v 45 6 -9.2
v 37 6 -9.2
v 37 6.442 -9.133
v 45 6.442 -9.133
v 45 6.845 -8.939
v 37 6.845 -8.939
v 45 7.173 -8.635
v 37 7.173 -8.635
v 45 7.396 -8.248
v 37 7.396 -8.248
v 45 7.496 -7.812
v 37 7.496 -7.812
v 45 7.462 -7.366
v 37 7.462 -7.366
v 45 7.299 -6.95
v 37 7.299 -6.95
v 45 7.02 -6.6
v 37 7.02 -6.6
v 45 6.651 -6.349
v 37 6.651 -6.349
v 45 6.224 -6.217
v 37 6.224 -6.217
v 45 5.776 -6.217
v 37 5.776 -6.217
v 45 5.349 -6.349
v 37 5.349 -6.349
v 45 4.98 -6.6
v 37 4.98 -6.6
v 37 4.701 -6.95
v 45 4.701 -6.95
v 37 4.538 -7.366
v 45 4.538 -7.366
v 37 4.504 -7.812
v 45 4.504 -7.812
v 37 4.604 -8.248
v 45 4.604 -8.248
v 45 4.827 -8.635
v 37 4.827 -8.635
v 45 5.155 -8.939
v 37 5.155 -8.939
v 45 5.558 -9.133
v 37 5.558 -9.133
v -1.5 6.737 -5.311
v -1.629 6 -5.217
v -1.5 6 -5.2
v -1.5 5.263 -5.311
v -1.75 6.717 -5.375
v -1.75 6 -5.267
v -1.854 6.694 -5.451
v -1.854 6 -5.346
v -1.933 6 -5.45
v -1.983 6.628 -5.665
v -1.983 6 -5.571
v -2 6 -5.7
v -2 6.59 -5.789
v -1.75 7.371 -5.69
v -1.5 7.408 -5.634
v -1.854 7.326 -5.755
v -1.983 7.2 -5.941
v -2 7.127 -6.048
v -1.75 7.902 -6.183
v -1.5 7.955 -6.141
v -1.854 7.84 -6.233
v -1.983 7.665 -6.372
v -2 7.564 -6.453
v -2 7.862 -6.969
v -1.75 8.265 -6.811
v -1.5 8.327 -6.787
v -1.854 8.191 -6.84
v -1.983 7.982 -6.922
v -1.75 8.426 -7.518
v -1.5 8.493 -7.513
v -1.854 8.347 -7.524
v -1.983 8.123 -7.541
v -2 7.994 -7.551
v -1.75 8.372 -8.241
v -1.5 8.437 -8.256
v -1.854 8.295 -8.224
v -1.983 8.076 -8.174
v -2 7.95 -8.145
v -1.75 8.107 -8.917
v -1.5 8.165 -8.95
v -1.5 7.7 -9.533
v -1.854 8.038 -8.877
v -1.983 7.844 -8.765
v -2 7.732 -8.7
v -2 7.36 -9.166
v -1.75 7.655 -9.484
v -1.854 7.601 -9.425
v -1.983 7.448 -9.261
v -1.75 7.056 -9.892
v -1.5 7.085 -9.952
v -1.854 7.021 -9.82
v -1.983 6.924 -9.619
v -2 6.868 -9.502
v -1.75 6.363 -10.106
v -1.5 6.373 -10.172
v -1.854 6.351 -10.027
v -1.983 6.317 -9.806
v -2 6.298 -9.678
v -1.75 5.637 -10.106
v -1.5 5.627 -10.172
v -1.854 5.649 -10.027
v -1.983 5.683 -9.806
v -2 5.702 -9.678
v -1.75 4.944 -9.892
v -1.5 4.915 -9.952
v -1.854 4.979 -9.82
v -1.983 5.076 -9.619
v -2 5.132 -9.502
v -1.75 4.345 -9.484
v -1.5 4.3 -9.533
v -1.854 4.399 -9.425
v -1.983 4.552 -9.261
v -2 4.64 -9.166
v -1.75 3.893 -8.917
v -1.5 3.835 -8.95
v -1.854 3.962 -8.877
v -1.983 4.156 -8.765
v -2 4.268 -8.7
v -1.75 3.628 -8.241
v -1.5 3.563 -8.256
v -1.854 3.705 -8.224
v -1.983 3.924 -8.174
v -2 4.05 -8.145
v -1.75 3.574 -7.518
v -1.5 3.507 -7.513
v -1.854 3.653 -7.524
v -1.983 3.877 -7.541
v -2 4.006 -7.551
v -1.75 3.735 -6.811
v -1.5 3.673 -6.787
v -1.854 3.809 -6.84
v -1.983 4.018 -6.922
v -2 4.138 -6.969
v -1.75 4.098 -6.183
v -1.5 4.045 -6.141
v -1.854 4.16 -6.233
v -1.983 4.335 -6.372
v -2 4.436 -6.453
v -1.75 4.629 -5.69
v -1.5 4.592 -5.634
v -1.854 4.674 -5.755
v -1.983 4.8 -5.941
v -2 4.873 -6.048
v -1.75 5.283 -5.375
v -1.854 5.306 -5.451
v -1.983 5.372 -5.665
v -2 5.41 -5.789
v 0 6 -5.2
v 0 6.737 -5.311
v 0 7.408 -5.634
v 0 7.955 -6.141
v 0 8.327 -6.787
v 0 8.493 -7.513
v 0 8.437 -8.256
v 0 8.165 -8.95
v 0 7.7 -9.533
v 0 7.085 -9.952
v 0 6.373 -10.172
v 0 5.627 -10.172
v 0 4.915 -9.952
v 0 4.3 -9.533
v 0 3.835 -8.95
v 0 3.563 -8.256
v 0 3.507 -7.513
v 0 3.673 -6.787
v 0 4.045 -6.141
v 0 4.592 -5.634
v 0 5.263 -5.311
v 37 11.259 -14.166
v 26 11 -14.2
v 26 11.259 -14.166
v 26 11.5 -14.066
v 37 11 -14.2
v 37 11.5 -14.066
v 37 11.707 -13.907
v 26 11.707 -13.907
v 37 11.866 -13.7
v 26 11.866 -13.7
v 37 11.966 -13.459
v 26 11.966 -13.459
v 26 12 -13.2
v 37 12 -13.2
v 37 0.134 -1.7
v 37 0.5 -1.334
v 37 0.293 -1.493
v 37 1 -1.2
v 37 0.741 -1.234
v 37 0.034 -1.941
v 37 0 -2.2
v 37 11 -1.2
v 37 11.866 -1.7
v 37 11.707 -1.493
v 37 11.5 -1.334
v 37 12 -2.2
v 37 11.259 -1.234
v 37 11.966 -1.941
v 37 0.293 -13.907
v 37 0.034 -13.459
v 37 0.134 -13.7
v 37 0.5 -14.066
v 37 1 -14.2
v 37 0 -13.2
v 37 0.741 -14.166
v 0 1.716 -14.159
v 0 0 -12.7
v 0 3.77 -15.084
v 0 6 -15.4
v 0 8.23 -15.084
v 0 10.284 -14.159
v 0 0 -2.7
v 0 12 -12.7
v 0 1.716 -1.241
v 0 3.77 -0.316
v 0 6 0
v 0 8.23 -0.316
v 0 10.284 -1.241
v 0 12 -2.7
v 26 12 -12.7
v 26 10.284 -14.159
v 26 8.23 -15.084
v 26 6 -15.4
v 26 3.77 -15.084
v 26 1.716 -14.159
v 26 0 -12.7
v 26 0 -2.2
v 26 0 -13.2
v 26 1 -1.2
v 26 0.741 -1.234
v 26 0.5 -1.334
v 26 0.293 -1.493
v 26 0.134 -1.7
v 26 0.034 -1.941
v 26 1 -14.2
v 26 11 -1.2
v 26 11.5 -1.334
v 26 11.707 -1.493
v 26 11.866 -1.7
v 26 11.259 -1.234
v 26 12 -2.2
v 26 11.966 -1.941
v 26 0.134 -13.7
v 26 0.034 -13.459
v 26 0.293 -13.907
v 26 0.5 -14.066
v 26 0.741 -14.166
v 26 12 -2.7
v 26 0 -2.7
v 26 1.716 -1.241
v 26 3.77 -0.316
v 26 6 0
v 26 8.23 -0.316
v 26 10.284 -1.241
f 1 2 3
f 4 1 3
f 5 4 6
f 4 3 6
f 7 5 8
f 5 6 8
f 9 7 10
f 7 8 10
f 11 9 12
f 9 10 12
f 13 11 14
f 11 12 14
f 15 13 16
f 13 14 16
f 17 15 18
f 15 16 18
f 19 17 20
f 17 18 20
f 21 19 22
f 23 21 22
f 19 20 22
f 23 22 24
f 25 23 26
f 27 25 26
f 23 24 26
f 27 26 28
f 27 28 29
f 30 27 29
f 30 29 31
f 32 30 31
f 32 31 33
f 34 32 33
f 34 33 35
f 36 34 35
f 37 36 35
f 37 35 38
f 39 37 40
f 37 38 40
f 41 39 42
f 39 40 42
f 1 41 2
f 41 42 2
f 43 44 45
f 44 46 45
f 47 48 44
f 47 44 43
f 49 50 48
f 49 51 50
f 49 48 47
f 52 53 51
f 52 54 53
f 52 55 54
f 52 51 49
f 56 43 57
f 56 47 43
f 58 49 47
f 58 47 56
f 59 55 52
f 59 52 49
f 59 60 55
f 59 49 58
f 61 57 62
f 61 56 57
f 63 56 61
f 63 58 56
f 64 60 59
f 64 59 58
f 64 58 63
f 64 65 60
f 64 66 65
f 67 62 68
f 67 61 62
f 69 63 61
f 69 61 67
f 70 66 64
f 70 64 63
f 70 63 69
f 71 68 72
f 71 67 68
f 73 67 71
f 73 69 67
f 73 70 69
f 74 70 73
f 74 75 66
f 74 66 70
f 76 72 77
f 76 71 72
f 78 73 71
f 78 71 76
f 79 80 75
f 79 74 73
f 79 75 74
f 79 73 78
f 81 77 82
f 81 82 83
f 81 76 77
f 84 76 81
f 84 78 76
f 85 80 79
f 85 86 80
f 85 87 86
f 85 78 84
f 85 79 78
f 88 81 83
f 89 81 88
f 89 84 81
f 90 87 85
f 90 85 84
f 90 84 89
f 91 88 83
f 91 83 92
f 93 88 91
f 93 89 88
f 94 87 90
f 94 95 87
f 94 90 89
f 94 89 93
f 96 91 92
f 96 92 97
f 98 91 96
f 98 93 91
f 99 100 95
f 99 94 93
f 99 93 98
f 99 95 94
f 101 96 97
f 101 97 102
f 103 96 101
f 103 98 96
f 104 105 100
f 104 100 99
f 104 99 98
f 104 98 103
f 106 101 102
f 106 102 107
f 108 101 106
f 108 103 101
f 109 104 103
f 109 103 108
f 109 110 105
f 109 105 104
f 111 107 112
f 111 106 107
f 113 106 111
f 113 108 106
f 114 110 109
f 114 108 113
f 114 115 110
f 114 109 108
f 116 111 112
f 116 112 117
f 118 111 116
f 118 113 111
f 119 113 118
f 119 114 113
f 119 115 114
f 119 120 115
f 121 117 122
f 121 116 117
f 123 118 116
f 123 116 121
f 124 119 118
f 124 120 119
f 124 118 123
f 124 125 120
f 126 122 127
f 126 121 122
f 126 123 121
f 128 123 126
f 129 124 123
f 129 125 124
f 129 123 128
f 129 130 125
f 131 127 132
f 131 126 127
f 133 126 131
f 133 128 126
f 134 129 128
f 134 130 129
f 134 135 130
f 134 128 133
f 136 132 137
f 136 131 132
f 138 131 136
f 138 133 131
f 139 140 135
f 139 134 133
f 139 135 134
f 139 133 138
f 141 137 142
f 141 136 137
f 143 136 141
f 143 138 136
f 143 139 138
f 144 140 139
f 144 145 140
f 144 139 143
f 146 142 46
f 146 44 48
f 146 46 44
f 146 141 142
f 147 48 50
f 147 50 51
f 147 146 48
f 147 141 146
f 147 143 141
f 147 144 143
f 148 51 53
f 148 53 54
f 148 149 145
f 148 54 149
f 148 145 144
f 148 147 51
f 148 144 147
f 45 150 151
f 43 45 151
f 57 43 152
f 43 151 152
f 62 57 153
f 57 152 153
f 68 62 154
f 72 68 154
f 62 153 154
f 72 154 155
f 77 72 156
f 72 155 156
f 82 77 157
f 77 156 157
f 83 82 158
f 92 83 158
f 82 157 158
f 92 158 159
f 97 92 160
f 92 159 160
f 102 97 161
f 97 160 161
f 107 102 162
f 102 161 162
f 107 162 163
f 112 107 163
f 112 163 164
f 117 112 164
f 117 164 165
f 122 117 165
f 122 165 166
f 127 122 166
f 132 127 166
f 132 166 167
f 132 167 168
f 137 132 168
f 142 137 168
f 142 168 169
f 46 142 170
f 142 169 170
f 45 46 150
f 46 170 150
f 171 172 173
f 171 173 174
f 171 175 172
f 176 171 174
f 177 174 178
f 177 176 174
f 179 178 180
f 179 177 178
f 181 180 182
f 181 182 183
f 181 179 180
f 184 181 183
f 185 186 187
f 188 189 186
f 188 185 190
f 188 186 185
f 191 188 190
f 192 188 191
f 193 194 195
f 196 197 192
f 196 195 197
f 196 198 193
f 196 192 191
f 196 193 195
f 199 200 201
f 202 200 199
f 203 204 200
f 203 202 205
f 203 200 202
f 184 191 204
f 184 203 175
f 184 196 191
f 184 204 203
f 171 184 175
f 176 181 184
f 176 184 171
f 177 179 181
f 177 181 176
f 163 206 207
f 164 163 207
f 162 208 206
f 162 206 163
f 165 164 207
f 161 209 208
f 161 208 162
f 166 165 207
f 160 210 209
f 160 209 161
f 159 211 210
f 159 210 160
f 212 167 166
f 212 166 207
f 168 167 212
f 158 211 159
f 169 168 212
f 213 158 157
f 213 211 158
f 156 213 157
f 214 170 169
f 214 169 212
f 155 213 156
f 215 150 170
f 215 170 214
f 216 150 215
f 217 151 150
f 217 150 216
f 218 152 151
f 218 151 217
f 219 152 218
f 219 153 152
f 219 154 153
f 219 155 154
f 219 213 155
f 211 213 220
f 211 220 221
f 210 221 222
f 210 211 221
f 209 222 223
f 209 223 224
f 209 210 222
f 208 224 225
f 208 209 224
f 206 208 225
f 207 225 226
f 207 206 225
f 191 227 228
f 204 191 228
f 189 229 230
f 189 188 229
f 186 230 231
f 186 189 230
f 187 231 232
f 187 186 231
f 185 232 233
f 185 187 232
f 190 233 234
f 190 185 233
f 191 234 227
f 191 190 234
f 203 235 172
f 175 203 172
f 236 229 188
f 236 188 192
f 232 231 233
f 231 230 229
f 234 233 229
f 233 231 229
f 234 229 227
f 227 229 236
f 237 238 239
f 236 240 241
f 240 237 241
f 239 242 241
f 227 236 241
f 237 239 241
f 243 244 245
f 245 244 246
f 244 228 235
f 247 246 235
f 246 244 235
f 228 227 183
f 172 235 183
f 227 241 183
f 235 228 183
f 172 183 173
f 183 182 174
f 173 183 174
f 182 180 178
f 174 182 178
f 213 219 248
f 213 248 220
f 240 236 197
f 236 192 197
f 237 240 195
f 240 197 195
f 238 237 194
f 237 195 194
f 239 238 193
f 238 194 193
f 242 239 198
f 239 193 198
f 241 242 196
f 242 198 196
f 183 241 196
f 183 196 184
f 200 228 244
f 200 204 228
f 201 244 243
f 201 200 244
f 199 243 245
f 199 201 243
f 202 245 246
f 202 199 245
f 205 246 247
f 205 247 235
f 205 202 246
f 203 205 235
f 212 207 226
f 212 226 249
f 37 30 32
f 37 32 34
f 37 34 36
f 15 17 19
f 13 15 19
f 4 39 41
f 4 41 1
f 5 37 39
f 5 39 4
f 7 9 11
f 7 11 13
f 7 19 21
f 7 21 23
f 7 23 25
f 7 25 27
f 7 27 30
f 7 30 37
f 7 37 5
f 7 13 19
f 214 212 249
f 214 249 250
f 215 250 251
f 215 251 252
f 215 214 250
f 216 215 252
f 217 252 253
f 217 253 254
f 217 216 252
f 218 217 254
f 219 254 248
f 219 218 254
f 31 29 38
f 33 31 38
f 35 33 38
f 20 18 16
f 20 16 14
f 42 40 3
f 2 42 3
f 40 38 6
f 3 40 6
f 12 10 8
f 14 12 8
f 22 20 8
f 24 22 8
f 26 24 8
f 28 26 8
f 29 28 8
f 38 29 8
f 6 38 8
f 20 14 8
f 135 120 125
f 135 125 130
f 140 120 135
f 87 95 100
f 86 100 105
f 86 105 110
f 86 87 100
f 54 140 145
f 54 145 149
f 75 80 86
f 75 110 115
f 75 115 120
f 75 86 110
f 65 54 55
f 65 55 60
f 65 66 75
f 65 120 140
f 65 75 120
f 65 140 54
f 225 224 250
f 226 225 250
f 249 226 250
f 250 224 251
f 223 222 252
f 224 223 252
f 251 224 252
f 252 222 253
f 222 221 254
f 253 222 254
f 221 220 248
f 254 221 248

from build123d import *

# Parameters (mm, degrees)
EXTRUDE_1_DEPTH = 26
SKETCH_2_W      = 13
SKETCH_2_H      = 12
EXTRUDE_2_DEPTH = 11
SKETCH_3_R      = 1.5
EXTRUDE_3_DEPTH = 8
SKETCH_4_R      = 2.5
EXTRUDE_4_DEPTH = 2
FILLET_1_R      = 0.5
FILLET_2_R      = 1


with BuildPart() as part:
    # Эскиз1 → Бобышка-Вытянуть1 (new body)
    with BuildSketch(Plane(origin=(0, 0, 0), x_dir=(0, 0, -1), z_dir=(1, 0, 0))):
        with BuildLine():
            Line((2.7, 12), (12.7, 12))
            ThreePointArc((12.7, 12), (15.4, 6), (12.7, 0))
            Line((12.7, 0), (2.7, 0))
            ThreePointArc((2.7, 0), (0, 6), (2.7, 12))
        make_face()
    extrude(amount=EXTRUDE_1_DEPTH)

    # Эскиз4 → Бобышка-Вытянуть4 (add)
    with BuildSketch(Plane.ZY):
        with Locations((-7.7, 6)):
            Circle(SKETCH_4_R)
    extrude(amount=EXTRUDE_4_DEPTH)

    # Скругление1
    fillet_1_edges = [part.edges().sort_by_distance(p)[0] for p in [
        (-2, 6, -10.2),
    ]]
    fillet(fillet_1_edges, radius=FILLET_1_R)


with BuildPart() as body_2:
    # Эскиз2 → Бобышка-Вытянуть2 (new body)
    with BuildSketch(Plane(origin=(26, 0, 0), x_dir=(0, 0, -1), z_dir=(1, 0, 0))):
        with Locations((7.7, 6)):
            Rectangle(SKETCH_2_W, SKETCH_2_H)
    extrude(amount=EXTRUDE_2_DEPTH)

    # Скругление2
    fillet_2_edges = [body_2.edges().sort_by_distance(p)[0] for p in [
        (31.5, 0, -14.2),
        (31.5, 0, -1.2),
        (31.5, 12, -1.2),
        (31.5, 12, -14.2),
    ]]
    fillet(fillet_2_edges, radius=FILLET_2_R)


with BuildPart() as body_3:
    # Эскиз3 → Бобышка-Вытянуть3 (new body)
    with BuildSketch(Plane(origin=(37, 0, 0), x_dir=(0, 0, -1), z_dir=(1, 0, 0))):
        with Locations((7.7, 6)):
            Circle(SKETCH_3_R)
    extrude(amount=EXTRUDE_3_DEPTH)


solid = Compound([part.part, body_2.part, body_3.part])
